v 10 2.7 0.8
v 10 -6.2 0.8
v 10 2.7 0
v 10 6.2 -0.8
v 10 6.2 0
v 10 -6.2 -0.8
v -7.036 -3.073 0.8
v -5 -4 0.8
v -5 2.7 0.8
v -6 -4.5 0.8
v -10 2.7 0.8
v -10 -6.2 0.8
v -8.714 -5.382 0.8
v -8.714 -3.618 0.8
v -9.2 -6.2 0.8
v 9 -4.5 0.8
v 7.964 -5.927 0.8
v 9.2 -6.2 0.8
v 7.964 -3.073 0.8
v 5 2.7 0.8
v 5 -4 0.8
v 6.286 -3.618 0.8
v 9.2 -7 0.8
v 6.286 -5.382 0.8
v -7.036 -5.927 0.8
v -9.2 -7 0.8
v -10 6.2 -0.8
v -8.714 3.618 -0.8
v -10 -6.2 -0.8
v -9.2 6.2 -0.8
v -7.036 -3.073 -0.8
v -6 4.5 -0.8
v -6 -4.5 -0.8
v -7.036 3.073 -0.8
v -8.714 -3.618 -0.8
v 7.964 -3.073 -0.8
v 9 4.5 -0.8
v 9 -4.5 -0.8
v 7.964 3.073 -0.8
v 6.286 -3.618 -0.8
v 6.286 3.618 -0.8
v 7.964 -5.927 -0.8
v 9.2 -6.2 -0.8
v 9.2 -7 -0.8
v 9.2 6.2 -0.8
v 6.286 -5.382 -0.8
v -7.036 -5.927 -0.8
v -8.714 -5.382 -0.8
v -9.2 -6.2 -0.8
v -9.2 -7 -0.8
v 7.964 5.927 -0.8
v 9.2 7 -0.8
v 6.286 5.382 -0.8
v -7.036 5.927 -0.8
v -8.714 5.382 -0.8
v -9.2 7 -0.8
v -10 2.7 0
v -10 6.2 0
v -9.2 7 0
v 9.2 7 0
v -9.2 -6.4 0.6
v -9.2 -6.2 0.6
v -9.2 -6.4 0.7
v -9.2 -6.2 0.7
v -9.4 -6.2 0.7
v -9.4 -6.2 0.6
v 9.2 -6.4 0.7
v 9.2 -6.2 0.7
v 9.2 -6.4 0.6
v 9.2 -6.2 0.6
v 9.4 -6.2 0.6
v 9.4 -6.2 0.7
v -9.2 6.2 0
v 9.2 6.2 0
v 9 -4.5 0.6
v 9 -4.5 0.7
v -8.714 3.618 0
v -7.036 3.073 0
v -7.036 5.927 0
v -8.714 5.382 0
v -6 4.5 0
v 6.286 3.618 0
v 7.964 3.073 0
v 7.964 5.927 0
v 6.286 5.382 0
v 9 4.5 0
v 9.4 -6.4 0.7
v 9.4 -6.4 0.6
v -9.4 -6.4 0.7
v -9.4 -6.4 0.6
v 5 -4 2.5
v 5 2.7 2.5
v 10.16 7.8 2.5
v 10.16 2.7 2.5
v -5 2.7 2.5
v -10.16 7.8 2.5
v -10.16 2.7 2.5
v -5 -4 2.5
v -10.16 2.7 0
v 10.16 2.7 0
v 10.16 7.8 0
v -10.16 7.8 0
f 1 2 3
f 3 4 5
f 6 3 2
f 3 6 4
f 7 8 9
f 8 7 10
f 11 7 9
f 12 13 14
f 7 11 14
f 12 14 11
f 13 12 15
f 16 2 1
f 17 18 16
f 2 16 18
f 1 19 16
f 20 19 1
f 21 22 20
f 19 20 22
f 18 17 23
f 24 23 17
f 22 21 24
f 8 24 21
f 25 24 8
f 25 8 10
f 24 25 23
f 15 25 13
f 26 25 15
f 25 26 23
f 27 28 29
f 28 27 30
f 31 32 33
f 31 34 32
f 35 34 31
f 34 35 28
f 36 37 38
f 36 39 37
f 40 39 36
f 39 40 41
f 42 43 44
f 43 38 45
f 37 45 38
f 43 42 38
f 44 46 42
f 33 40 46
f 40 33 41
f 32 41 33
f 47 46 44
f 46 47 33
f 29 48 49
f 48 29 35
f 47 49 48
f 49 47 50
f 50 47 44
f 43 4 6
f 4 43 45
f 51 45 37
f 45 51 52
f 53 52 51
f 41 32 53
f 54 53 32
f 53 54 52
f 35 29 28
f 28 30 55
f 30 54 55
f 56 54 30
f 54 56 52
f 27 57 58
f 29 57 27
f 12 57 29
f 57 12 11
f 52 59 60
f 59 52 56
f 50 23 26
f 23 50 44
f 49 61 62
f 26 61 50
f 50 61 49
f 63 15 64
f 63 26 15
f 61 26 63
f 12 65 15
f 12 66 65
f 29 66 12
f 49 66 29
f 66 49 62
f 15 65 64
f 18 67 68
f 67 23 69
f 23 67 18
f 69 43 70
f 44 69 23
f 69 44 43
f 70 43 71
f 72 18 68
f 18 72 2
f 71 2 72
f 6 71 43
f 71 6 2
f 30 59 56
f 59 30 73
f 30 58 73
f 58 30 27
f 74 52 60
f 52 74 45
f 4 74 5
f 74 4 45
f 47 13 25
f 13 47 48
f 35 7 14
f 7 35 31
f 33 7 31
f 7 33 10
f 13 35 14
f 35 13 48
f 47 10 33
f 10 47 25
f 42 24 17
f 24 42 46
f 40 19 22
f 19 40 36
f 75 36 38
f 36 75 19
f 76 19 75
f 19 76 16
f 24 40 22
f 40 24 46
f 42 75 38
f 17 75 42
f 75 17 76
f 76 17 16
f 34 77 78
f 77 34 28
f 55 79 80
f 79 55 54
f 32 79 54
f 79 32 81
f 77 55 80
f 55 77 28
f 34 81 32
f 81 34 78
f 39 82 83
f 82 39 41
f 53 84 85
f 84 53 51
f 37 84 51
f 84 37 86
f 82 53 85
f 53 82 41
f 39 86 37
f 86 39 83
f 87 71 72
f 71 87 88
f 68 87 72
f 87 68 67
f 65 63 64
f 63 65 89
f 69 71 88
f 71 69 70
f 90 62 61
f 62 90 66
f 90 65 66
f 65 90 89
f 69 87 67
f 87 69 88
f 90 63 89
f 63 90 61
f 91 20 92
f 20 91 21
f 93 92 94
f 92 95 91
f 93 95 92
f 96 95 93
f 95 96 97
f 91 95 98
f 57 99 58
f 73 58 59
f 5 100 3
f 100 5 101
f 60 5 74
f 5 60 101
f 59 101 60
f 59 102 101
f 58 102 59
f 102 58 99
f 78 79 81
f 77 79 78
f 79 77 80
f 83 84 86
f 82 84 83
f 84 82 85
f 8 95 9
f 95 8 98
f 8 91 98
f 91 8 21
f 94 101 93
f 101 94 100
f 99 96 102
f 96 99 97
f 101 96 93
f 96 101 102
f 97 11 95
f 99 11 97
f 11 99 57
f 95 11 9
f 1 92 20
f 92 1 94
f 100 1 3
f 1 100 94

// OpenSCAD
// Parameters
pcb_L = 20; //[10:40:0.1]
pcb_W = 14; //[7:28:0.1]
pcb_T = 1.6; //[0.8:3.2:0.1]
eps = 0.8; //[0.2:2:0.1]
hole_d = 3; //[1.5:5:0.1]
hole_edge_margin = 2.5; //[1.5:5:0.1]
chamfer = 0.8; //[0.2:2:0.1]
silk_T = 0.1; //[0.05:0.3:0.05]
silk_margin = 0.6; //[0.2:2:0.1]
silk_line_w = 0.4; //[0.2:1:0.1]
comp_H = 2.5; //[1:6:0.1]
comp_L = 10; //[5:18:0.1]
comp_W = 8; //[4:12:0.1]
header_rows = 2; //[1:2:1]
header_pins = 8; //[4:16:1]
header_pitch = 2.54; //[2:3:0.01]
header_body_W = 5.1; //[3:8:0.1]
header_body_H = 2.5; //[1.5:5:0.1]

// Main PCB Body
module pcb_main_body() {
  color([0.0, 0.4, 0.2]) // Green for PCB
  cube([pcb_L, pcb_W, pcb_T], center=true);
}

// Mounting Holes
module mounting_hole() {
  cylinder(h=pcb_T + 2*eps, r=hole_d/2, center=true);
}

// Chamfer Cut
module chamfer_cut() {
  cube([chamfer, chamfer, pcb_T + 2*eps], center=true);
}

// Silkscreen Line
module silk_line(length, width, height) {
  cube([length, width, height], center=true);
}

// Component Placeholder
module component_placeholder() {
  color([0.85, 0.85, 0.8]) // Off-white for components
  cube([comp_L, comp_W, comp_H], center=true);
}

// Pin Header Block
module pin_header_block() {
  color([0.1, 0.1, 0.6]) // Blue for headers
  cube([(header_pins - 1)*header_pitch + header_pitch, header_body_W, header_body_H], center=true);
}

// Assemble PCB
module complete_model() {
  difference() {
    pcb_main_body();
    // Chamfer corners
    translate([-pcb_L/2 + chamfer/2, -pcb_W/2 + chamfer/2, 0]) chamfer_cut();
    translate([pcb_L/2 - chamfer/2, -pcb_W/2 + chamfer/2, 0]) chamfer_cut();
    translate([-pcb_L/2 + chamfer/2, pcb_W/2 - chamfer/2, 0]) chamfer_cut();
    translate([pcb_L/2 - chamfer/2, pcb_W/2 - chamfer/2, 0]) chamfer_cut();
    // Mounting holes
    translate([-pcb_L/2 + hole_edge_margin, -pcb_W/2 + hole_edge_margin, 0]) mounting_hole();
    translate([pcb_L/2 - hole_edge_margin, -pcb_W/2 + hole_edge_margin, 0]) mounting_hole();
    translate([-pcb_L/2 + hole_edge_margin, pcb_W/2 - hole_edge_margin, 0]) mounting_hole();
    translate([pcb_L/2 - hole_edge_margin, pcb_W/2 - hole_edge_margin, 0]) mounting_hole();
  }
  
  // Silkscreen markings
  union() {
    translate([0, pcb_W/2 - silk_margin - silk_line_w/2, pcb_T/2 + silk_T/2 - eps/4]) silk_line(pcb_L - 2*silk_margin, silk_line_w, silk_T);
    translate([0, -pcb_W/2 + silk_margin + silk_line_w/2, pcb_T/2 + silk_T/2 - eps/4]) silk_line(pcb_L - 2*silk_margin, silk_line_w, silk_T);
    translate([pcb_L/2 - silk_margin - silk_line_w/2, 0, pcb_T/2 + silk_T/2 - eps/4]) silk_line(silk_line_w, pcb_W - 2*silk_margin, silk_T);
    translate([-pcb_L/2 + silk_margin + silk_line_w/2, 0, pcb_T/2 + silk_T/2 - eps/4]) silk_line(silk_line_w, pcb_W - 2*silk_margin, silk_T);
  }
  
  // Component placeholders
  translate([0, 0, pcb_T/2 + comp_H/2 - eps]) component_placeholder();
  
  // Pin headers
  translate([0, pcb_W/2 - header_body_W/2 + eps, pcb_T/2 + header_body_H/2 - eps]) pin_header_block();
}

// Render the complete model
complete_model();
